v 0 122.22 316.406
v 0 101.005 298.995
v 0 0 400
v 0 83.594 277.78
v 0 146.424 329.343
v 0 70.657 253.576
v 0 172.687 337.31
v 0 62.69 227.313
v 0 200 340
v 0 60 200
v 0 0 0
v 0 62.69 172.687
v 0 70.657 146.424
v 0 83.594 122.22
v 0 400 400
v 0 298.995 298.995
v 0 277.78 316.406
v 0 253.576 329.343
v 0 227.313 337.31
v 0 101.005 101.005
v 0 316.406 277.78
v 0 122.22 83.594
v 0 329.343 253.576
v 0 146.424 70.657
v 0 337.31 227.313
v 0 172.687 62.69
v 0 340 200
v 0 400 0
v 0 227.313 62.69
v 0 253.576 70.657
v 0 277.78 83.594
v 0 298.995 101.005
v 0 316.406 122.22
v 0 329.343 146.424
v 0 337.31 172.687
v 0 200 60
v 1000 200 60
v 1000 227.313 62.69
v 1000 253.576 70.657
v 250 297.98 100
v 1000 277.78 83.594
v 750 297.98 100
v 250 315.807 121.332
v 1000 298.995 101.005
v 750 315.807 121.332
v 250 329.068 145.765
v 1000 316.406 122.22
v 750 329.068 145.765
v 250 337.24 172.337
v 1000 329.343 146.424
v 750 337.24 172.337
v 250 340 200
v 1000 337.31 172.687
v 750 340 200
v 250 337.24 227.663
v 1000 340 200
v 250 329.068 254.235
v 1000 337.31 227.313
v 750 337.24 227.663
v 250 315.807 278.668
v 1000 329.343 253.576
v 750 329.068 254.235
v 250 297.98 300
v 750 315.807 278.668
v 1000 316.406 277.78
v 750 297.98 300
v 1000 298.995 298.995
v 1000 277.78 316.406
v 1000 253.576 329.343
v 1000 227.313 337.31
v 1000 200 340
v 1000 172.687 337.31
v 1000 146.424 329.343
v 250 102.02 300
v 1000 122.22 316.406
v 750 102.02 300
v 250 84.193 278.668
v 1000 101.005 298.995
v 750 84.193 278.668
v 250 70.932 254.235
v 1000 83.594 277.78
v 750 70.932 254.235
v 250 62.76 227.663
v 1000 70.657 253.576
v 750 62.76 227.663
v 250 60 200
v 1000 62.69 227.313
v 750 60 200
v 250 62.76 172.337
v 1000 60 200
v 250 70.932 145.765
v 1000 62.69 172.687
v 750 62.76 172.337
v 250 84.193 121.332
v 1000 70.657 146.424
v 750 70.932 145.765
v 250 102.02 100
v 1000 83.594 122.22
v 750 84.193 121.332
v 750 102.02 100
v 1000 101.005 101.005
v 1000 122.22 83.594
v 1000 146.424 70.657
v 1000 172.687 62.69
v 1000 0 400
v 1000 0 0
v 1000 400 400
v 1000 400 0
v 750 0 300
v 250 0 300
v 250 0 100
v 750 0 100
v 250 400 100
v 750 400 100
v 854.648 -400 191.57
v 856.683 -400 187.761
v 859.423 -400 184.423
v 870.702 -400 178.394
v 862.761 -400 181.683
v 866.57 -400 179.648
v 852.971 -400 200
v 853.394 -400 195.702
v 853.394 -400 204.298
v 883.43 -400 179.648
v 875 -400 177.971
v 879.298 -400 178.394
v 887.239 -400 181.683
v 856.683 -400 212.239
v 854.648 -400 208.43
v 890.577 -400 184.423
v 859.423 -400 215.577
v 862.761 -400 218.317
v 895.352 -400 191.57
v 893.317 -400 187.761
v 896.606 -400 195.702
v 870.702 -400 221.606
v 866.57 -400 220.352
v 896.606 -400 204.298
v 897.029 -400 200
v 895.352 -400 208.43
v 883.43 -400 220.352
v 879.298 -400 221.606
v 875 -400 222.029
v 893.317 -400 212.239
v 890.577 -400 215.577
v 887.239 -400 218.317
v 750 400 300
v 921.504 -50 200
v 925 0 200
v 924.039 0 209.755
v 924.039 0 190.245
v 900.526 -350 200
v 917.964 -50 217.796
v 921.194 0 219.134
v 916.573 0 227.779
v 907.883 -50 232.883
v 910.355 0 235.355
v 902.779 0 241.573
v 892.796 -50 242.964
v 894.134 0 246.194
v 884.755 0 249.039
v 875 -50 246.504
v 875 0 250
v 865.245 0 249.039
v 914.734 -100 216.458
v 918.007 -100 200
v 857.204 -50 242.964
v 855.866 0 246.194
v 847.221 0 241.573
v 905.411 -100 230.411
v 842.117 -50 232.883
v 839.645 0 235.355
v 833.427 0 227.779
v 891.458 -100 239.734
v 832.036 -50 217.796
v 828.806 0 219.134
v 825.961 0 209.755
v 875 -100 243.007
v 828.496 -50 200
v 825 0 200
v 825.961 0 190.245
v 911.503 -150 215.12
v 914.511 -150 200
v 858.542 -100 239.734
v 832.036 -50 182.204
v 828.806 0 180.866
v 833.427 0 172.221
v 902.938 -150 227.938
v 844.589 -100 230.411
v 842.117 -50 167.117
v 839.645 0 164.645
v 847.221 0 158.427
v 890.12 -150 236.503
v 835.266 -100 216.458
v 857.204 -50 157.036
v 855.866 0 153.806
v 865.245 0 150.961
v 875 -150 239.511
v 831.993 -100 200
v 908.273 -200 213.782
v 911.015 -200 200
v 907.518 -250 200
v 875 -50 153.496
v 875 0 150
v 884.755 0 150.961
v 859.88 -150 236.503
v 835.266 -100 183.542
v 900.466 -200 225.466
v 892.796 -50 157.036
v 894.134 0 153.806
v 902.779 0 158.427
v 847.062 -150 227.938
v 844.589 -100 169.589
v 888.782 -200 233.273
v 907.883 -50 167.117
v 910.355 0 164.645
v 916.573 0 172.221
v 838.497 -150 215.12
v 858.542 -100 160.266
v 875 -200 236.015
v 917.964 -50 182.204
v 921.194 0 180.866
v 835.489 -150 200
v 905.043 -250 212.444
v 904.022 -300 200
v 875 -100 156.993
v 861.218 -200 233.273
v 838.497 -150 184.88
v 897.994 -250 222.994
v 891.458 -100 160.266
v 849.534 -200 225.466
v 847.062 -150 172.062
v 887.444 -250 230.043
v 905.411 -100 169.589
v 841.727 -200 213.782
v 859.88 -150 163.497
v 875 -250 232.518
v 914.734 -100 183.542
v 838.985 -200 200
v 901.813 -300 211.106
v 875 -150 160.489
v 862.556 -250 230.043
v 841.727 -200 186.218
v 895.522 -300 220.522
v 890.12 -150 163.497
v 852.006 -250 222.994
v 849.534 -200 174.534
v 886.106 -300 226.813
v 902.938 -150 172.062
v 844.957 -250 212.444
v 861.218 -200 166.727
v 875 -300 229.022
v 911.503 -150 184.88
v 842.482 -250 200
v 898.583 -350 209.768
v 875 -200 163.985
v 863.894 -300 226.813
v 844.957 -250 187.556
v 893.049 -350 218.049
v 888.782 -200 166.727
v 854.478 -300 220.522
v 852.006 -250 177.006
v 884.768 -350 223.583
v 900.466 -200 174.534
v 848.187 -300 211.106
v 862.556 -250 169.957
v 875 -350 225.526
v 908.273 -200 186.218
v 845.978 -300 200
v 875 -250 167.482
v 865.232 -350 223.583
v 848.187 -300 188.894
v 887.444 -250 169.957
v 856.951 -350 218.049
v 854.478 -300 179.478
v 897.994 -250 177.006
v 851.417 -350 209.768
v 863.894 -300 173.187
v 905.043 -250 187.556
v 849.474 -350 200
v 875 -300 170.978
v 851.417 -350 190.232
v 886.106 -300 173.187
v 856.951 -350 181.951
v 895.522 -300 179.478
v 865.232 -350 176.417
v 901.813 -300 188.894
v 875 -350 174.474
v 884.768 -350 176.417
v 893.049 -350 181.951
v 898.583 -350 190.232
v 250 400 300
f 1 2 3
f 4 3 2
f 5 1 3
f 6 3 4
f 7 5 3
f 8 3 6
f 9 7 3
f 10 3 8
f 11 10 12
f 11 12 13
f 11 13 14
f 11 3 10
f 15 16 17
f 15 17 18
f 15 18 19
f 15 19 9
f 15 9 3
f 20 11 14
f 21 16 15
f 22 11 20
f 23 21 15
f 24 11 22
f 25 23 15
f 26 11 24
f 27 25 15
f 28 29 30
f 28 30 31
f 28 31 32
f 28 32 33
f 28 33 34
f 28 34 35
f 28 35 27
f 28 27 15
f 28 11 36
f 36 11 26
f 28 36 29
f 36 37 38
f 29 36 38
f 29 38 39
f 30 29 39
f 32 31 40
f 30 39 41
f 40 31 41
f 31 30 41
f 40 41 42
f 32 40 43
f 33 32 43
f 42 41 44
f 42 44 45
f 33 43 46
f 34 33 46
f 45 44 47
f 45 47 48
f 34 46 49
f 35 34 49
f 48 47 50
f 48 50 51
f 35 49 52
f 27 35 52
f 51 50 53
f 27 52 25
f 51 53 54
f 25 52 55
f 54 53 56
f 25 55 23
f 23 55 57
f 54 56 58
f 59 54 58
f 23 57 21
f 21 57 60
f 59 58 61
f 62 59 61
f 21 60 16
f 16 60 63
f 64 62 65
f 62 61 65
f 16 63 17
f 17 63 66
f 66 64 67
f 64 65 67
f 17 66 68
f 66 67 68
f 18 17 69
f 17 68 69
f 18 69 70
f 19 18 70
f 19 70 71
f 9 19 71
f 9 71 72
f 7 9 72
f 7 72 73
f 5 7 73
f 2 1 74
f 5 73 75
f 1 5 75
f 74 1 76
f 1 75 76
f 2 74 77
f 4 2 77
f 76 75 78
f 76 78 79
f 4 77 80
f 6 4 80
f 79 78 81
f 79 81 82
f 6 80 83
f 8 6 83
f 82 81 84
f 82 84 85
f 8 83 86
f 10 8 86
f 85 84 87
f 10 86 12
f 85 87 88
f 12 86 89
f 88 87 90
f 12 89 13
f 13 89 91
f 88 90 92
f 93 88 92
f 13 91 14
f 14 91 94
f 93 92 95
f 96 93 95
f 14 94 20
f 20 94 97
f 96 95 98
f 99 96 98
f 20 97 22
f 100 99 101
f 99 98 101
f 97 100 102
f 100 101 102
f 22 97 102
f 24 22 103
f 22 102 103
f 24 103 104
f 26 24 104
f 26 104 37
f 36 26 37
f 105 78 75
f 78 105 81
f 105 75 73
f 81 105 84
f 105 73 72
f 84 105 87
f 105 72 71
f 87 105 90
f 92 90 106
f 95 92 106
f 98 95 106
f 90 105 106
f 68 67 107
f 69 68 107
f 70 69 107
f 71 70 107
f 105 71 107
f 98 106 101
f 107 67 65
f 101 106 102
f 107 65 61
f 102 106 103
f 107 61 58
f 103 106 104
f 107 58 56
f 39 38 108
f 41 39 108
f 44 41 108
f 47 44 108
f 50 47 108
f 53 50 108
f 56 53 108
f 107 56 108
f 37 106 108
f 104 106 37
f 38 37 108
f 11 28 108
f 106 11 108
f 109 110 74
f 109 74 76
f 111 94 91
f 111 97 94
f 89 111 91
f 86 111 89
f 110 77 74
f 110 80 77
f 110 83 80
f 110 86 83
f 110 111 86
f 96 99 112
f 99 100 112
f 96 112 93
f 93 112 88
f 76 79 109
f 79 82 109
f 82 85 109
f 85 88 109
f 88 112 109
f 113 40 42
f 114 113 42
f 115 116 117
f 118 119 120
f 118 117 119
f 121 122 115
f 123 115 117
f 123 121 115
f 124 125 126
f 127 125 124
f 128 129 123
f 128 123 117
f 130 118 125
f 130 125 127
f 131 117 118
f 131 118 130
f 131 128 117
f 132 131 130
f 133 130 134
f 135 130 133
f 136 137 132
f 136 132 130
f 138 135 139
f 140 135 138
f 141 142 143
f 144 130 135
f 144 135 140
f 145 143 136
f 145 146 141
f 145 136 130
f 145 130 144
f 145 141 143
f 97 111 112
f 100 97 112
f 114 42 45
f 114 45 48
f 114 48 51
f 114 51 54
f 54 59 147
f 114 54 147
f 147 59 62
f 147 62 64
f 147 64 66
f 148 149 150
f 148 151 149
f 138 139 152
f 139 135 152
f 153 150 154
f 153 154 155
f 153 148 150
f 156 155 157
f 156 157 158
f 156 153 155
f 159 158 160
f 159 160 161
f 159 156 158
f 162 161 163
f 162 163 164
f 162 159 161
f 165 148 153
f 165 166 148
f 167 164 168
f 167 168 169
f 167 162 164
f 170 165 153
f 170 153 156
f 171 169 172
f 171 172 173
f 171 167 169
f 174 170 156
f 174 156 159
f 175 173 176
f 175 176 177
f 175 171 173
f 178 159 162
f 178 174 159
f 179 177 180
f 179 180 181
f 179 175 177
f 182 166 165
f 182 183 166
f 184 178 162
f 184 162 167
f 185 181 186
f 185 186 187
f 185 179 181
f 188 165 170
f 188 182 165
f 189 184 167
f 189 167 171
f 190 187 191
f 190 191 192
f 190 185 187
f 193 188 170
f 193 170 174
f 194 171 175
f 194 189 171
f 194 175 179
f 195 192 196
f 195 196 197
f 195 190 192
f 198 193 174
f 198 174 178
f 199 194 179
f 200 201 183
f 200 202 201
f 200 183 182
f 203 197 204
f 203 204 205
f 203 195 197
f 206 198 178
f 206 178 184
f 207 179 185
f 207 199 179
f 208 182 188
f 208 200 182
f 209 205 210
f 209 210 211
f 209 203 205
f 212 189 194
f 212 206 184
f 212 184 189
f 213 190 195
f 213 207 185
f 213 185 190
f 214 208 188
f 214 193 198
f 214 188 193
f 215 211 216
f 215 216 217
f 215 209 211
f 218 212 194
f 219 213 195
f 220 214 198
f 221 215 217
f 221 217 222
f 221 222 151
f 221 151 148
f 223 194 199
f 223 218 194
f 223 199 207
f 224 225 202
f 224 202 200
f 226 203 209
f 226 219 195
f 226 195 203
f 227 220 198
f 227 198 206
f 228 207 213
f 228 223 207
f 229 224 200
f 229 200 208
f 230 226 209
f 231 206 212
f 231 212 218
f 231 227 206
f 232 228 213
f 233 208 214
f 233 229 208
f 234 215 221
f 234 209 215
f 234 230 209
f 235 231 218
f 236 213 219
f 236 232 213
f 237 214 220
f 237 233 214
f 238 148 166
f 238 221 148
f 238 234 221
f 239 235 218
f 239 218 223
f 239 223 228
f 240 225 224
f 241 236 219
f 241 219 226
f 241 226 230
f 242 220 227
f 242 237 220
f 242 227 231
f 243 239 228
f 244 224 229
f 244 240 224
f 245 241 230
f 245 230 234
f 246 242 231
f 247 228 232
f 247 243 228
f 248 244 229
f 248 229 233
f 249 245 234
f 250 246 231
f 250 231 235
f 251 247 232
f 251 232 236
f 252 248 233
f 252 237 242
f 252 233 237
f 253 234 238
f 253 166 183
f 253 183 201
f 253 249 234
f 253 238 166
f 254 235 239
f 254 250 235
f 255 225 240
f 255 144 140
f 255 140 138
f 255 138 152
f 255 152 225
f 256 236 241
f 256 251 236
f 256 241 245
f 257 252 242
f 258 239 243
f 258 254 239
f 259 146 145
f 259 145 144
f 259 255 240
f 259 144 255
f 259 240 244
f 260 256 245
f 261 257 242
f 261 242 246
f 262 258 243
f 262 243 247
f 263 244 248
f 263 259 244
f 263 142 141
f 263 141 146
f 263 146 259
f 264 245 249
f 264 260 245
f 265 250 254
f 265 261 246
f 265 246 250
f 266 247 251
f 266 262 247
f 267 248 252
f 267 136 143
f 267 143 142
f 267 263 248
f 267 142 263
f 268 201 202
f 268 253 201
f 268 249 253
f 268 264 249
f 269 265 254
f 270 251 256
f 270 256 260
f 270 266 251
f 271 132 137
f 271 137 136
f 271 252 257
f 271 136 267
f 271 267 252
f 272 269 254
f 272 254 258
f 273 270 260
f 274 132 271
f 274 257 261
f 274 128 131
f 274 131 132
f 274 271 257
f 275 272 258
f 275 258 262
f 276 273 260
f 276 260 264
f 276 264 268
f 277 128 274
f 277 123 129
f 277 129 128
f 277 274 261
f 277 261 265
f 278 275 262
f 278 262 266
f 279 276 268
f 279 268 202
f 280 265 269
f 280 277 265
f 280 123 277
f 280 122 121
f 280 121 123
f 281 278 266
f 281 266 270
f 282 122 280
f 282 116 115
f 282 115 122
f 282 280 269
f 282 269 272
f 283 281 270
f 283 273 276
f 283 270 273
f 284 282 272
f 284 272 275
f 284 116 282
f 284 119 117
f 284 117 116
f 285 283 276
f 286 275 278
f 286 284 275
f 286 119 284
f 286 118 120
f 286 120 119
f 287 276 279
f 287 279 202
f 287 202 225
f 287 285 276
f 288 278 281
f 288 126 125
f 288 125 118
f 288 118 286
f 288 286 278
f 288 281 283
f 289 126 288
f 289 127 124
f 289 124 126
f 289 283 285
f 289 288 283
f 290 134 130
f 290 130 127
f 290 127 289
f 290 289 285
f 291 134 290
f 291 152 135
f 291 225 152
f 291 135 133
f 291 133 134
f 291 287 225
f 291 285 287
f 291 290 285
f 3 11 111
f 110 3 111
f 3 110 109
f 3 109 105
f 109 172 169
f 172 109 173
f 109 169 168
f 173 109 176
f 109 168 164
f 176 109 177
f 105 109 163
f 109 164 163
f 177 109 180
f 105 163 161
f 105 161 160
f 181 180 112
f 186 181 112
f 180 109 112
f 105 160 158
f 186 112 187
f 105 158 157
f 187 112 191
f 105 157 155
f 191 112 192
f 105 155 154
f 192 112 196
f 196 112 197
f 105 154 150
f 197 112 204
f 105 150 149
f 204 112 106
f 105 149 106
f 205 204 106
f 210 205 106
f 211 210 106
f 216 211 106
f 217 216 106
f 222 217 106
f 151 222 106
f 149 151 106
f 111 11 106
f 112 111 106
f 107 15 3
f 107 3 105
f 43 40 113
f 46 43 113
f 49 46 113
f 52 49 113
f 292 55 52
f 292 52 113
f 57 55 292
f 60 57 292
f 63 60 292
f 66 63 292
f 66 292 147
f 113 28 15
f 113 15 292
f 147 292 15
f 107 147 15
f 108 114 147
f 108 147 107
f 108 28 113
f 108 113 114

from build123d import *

# Parameters (mm, degrees)
CROQUIS1_W              = 1000
CROQUIS1_H              = 400
SALIENTE_EXTRUIR1_DEPTH = 400
CROQUIS2_R              = 140
CORTAR_EXTRUIR1_DEPTH   = 1000
CROQUIS3_W              = 500
CROQUIS3_H              = 200
CORTAR_EXTRUIR2_DEPTH   = 400
CROQUIS4_R              = 50
SALIENTE_EXTRUIR2_DEPTH = 400
SALIENTE_EXTRUIR2_TAPER = 4


with BuildPart() as part:
    # Croquis1 → Saliente-Extruir1 (new body)
    with BuildSketch(Plane.XY):
        with Locations((500, 200)):
            Rectangle(CROQUIS1_W, CROQUIS1_H)
    extrude(amount=SALIENTE_EXTRUIR1_DEPTH)

    # Croquis2 → Cortar-Extruir1 (cut)
    with BuildSketch(Plane(origin=(1000, 0, 0), x_dir=(0, 0, -1), z_dir=(1, 0, 0))):
        with Locations((-200, 200)):
            Circle(CROQUIS2_R)
    extrude(amount=-CORTAR_EXTRUIR1_DEPTH, mode=Mode.SUBTRACT)

    # Croquis3 → Cortar-Extruir2 (cut)
    with BuildSketch(Plane.XZ):
        with Locations((500, 200)):
            Rectangle(CROQUIS3_W, CROQUIS3_H)
    extrude(amount=-CORTAR_EXTRUIR2_DEPTH, mode=Mode.SUBTRACT)

    # Croquis4 → Saliente-Extruir2 (add)
    with BuildSketch(Plane.XZ):
        with Locations((875, 200)):
            Circle(CROQUIS4_R)
    extrude(amount=SALIENTE_EXTRUIR2_DEPTH, taper=SALIENTE_EXTRUIR2_TAPER)


solid = part.part
